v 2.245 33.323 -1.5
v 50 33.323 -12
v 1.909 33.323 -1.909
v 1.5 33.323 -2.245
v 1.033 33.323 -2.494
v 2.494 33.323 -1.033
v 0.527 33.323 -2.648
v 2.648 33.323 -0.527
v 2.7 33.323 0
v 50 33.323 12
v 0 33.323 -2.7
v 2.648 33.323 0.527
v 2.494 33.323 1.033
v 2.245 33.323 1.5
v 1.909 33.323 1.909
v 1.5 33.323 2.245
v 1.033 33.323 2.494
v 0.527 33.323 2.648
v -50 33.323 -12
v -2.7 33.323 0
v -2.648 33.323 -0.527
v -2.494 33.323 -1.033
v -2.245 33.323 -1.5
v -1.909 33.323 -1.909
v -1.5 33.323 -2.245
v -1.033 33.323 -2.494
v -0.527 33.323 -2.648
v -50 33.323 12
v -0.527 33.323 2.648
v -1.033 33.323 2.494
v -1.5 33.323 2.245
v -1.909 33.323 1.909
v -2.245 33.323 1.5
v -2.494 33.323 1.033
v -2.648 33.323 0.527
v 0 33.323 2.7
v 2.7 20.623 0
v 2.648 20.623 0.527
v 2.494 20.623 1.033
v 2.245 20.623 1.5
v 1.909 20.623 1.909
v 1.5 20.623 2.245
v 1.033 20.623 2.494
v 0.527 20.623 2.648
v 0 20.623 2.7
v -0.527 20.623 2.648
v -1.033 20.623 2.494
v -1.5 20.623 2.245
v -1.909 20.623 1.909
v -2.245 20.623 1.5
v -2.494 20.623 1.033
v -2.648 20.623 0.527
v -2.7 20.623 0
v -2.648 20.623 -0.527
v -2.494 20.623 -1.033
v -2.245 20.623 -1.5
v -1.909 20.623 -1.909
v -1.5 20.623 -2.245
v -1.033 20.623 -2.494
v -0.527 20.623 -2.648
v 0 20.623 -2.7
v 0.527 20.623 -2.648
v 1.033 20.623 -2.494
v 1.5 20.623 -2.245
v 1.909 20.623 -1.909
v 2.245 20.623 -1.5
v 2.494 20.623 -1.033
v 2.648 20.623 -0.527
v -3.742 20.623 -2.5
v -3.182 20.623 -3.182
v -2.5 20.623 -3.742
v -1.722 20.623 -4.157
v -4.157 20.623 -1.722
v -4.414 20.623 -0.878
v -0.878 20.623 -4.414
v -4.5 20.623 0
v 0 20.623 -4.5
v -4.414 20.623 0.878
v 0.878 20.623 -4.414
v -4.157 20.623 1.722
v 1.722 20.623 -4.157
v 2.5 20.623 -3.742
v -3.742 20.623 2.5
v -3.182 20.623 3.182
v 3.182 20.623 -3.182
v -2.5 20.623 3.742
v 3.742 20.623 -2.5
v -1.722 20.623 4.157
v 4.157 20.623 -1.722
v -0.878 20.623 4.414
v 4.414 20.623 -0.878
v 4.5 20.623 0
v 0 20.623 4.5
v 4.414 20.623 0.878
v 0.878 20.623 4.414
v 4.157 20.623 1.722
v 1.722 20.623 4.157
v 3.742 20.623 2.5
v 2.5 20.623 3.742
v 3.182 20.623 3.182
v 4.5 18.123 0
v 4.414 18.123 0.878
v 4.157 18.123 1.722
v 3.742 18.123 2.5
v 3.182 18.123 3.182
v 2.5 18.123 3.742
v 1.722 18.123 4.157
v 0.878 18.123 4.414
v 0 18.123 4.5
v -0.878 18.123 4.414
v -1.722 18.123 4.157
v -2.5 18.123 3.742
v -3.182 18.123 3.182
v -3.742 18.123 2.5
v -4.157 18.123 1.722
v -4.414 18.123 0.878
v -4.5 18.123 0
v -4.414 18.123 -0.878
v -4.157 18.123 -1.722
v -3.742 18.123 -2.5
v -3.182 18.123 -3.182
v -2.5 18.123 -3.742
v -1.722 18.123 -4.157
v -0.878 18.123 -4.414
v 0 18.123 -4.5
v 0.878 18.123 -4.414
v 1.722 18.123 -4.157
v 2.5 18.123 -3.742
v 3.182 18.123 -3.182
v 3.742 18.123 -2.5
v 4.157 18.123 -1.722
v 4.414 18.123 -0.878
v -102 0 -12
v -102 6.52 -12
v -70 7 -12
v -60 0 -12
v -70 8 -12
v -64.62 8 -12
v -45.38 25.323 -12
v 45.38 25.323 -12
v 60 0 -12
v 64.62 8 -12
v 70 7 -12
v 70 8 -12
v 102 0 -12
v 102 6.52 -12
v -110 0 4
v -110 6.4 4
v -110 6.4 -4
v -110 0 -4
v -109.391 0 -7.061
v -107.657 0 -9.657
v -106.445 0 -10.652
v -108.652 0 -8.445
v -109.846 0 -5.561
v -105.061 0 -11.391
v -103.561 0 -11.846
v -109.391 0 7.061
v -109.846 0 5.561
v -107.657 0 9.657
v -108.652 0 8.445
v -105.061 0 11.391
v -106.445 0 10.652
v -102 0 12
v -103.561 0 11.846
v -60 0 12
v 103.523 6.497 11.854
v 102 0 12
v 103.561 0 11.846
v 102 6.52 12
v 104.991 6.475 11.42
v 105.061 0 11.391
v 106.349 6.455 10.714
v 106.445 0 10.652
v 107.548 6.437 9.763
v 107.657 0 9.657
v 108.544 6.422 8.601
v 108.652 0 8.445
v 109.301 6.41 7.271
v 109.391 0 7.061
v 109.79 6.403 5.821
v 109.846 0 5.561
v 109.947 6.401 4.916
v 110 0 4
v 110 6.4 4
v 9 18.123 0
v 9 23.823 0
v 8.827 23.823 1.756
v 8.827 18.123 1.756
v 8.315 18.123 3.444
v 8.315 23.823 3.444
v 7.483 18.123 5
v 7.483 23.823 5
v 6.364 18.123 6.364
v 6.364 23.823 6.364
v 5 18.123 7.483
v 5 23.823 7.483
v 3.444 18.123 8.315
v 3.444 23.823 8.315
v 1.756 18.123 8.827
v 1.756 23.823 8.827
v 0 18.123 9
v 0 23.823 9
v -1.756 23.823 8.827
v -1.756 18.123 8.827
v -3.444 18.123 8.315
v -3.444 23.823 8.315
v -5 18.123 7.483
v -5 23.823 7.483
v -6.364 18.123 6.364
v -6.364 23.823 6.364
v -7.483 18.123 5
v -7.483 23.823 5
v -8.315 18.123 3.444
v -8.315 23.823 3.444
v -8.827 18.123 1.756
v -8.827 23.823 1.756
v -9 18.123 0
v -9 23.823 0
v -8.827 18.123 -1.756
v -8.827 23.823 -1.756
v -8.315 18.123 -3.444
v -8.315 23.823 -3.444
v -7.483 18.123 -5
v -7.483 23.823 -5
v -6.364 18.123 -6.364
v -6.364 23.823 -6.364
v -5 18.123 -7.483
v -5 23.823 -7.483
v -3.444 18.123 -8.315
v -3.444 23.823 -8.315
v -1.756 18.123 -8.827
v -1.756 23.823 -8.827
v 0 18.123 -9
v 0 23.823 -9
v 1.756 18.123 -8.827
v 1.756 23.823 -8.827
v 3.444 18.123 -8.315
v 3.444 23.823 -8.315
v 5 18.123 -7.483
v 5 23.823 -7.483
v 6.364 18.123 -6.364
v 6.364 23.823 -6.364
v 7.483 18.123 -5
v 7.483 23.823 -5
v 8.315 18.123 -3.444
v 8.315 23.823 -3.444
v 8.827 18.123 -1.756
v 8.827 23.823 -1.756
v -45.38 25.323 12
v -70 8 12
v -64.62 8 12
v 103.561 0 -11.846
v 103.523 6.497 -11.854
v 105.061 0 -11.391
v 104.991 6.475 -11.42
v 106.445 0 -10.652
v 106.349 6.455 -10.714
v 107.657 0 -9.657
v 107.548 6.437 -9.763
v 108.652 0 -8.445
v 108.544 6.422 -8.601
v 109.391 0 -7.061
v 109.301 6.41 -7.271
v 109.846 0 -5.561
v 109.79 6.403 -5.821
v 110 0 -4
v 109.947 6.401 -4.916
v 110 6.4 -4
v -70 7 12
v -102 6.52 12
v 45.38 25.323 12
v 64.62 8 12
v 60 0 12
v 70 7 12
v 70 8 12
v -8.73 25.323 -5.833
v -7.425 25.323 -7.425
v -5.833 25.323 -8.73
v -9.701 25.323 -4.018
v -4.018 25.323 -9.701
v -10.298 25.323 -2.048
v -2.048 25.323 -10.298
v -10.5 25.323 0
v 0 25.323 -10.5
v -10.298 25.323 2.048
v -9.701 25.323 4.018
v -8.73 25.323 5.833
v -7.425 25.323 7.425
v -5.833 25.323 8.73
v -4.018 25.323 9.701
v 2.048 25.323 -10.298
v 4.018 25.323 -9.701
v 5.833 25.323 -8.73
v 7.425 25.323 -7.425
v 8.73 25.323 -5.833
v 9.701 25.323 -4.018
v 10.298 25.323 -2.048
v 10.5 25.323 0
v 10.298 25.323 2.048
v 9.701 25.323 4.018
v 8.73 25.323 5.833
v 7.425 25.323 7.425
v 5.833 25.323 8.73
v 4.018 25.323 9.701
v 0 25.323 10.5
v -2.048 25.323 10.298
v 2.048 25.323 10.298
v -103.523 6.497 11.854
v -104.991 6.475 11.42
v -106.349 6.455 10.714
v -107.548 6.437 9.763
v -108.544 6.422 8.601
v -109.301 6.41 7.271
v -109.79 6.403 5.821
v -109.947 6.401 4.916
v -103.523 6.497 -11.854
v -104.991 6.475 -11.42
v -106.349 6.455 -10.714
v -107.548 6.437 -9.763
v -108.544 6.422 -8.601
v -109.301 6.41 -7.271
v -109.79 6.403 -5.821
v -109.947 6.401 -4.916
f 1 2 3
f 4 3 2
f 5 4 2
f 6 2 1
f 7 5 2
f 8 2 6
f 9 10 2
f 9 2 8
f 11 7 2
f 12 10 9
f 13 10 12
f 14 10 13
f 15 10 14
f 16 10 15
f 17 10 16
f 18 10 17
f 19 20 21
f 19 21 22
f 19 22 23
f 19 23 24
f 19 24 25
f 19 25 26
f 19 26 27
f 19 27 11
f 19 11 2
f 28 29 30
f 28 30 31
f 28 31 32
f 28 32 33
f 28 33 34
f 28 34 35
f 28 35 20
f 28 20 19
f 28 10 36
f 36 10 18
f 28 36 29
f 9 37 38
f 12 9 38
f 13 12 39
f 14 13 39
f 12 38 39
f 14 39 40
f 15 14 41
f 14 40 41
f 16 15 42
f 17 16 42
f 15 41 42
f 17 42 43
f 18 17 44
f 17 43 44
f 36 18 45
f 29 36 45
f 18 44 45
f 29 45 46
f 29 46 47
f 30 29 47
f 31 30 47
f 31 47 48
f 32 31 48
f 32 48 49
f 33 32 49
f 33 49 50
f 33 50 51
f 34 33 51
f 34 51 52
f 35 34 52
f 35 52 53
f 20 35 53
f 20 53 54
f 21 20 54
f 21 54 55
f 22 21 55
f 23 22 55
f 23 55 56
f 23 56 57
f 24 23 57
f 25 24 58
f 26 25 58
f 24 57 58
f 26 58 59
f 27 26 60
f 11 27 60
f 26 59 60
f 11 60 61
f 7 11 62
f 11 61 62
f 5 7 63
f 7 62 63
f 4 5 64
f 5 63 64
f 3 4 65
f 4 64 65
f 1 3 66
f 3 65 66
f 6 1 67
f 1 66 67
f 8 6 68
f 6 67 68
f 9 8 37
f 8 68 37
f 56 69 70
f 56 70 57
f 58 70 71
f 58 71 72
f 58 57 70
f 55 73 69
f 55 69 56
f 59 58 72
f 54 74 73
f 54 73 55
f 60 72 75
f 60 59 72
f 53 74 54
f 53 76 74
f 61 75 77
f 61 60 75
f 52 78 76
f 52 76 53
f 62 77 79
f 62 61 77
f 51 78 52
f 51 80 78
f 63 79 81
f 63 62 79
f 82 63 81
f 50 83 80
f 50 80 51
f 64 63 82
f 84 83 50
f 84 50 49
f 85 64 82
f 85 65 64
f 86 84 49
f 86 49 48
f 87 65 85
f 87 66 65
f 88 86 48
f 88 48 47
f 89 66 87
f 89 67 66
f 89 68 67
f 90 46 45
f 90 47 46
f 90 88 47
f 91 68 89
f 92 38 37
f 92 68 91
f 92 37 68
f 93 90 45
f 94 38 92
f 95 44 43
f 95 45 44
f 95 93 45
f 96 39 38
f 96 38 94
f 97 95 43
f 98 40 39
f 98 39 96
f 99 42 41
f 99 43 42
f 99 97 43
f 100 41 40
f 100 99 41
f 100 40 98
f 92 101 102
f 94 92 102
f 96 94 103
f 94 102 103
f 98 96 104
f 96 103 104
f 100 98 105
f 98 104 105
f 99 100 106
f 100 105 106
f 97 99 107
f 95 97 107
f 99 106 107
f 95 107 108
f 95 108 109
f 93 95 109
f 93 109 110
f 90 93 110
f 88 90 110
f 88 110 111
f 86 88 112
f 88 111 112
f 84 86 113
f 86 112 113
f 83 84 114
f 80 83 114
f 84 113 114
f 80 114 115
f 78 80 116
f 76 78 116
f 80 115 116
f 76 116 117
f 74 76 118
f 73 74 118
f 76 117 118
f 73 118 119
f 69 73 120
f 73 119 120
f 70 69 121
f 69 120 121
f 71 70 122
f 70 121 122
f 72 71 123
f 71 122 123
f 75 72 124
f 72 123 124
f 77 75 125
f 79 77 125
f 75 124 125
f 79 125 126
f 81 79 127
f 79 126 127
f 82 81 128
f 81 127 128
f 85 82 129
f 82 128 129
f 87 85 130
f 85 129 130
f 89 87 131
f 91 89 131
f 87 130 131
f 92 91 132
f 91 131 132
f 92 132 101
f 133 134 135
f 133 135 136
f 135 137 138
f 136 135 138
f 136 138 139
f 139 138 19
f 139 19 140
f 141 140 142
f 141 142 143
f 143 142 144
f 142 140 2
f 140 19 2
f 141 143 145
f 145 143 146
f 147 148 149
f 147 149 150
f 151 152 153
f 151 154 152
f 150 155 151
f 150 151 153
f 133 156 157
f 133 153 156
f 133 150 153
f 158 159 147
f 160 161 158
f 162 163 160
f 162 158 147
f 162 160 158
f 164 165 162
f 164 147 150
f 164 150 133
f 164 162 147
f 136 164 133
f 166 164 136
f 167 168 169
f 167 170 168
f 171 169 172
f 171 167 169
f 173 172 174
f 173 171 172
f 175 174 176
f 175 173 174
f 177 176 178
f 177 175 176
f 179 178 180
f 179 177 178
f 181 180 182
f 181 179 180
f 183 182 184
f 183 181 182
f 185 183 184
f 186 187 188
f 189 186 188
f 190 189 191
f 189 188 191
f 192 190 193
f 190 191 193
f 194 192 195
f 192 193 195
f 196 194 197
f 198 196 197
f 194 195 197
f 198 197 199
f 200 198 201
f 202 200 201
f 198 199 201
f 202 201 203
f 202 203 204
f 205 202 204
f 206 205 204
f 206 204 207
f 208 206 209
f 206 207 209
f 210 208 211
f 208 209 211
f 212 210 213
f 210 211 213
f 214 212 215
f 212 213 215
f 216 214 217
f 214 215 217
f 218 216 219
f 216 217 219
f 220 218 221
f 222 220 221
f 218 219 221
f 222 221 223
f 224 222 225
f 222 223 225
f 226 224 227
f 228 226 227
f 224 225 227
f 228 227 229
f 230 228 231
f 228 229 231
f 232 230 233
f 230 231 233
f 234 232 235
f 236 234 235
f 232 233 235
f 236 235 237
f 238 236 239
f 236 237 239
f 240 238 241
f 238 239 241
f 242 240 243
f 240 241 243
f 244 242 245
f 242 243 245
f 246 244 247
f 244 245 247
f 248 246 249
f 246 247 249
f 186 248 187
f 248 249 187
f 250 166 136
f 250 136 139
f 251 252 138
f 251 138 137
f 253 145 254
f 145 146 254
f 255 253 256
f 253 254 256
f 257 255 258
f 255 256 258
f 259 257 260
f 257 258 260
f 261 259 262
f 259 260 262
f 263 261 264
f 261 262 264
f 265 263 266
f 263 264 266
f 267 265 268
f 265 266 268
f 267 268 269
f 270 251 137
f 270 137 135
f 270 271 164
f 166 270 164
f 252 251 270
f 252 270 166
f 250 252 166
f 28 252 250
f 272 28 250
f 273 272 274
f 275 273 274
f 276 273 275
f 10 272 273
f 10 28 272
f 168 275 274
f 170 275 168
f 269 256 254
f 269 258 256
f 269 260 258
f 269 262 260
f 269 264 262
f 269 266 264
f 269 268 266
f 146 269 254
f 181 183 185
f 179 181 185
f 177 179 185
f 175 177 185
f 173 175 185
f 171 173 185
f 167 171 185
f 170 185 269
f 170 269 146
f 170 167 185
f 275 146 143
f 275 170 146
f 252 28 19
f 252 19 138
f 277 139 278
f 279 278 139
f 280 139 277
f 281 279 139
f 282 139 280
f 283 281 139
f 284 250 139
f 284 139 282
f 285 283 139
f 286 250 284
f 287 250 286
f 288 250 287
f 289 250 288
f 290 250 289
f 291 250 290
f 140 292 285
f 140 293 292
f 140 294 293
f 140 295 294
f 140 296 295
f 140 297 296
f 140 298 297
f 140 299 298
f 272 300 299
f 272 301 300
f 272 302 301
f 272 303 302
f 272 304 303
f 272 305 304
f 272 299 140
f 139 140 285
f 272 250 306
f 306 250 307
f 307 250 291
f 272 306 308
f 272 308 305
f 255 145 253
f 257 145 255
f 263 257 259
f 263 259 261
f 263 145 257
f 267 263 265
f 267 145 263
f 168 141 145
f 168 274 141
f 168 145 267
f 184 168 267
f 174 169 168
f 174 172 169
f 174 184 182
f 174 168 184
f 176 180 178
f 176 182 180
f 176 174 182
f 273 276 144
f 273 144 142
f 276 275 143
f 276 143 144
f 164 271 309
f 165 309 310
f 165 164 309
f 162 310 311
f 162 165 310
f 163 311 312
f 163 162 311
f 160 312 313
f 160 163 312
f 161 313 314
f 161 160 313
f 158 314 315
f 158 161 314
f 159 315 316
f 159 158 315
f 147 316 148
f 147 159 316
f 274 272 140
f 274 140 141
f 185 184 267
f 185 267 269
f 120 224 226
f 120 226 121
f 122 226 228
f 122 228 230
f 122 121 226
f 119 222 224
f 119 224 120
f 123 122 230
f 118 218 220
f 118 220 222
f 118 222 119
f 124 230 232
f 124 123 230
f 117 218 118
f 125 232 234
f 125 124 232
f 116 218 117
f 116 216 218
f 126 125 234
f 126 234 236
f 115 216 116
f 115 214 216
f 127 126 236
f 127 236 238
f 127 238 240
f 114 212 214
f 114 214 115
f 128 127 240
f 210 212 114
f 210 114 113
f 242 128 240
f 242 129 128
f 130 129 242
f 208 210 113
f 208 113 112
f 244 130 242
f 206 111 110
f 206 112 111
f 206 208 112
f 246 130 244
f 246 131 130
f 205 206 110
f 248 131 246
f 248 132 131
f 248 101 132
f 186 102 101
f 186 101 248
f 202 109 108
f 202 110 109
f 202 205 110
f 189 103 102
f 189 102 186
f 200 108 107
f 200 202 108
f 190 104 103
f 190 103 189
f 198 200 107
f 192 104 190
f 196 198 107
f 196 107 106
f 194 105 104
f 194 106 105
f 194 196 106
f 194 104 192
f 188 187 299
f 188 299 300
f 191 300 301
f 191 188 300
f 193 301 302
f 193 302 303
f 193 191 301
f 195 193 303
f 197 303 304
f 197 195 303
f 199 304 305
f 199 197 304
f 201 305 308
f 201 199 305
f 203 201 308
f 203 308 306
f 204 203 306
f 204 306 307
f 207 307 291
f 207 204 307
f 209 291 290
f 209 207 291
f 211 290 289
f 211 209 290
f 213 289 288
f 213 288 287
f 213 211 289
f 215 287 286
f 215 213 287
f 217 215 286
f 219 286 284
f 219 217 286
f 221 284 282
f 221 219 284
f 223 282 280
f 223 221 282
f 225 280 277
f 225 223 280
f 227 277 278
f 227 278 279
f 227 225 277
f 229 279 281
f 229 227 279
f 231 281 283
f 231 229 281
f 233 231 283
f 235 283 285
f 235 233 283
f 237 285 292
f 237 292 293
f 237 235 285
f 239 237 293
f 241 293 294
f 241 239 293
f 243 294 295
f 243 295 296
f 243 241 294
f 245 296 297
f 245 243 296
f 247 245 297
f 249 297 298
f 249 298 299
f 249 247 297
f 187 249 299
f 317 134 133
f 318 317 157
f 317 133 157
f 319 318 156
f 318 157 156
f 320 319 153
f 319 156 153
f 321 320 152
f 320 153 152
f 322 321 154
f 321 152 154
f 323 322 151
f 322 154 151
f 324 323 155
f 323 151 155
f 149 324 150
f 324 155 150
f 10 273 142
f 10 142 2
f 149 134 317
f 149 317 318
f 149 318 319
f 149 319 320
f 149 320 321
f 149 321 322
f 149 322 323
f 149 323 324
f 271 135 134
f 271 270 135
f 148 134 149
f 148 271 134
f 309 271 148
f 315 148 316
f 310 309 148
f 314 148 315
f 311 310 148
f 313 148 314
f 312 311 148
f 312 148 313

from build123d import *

# Parameters (mm, degrees)
PAD_DEPTH       = 12
SKETCH002_R     = 9
PAD001_DEPTH    = 7.2
SKETCH003_R     = 4.5
POCKET_DEPTH    = 2.5
SKETCH004_R     = 2.7
POCKET001_DEPTH = 12.701
CHAMFER_SIZE    = 1.5
FILLET_R        = 8


with BuildPart() as part:
    # Sketch → Pad (new body, symmetric)
    with BuildSketch(Plane.XY):
        Polygon((-110, 0), (-60, 0), (-45.38, 25.322583), (45.38, 25.322583), (60, 0), (110, 0), (110, 6.4), (70, 7), (70, 8), (64.62, 8), (50, 33.322583), (-50, 33.322583), (-64.62, 8), (-70, 8), (-70, 7), (-110, 6.4), align=None)
    extrude(amount=PAD_DEPTH, both=True)

    # Sketch002 → Pad001 (join)
    with BuildSketch(Plane.XZ.offset(-25.322583)):
        Circle(SKETCH002_R)
    extrude(amount=PAD001_DEPTH)

    # Sketch003 (on Face20 of Pad001) → Pocket (cut)
    with BuildSketch(Plane.XZ.offset(-18.122583)):
        Circle(SKETCH003_R)
    extrude(amount=-POCKET_DEPTH, mode=Mode.SUBTRACT)

    # Sketch004 (on Face22 of Pocket) → Pocket001 (cut, through all)
    with BuildSketch(Plane.XZ.offset(-20.622583)):
        Circle(SKETCH004_R)
    extrude(amount=-POCKET001_DEPTH, mode=Mode.SUBTRACT)

    # Chamfer
    chamfer_edges = [part.edges().sort_by_distance(p)[0] for p in [
        (-9, 25.322583, 0),
    ]]
    chamfer(chamfer_edges, length=CHAMFER_SIZE)

    # Fillet
    fillet_edges = [part.edges().sort_by_distance(p)[0] for p in [
        (-110, 3.2, -12),
        (-110, 3.2, 12),
        (110, 3.2, -12),
        (110, 3.2, 12),
    ]]
    fillet(fillet_edges, radius=FILLET_R)


solid = part.part
